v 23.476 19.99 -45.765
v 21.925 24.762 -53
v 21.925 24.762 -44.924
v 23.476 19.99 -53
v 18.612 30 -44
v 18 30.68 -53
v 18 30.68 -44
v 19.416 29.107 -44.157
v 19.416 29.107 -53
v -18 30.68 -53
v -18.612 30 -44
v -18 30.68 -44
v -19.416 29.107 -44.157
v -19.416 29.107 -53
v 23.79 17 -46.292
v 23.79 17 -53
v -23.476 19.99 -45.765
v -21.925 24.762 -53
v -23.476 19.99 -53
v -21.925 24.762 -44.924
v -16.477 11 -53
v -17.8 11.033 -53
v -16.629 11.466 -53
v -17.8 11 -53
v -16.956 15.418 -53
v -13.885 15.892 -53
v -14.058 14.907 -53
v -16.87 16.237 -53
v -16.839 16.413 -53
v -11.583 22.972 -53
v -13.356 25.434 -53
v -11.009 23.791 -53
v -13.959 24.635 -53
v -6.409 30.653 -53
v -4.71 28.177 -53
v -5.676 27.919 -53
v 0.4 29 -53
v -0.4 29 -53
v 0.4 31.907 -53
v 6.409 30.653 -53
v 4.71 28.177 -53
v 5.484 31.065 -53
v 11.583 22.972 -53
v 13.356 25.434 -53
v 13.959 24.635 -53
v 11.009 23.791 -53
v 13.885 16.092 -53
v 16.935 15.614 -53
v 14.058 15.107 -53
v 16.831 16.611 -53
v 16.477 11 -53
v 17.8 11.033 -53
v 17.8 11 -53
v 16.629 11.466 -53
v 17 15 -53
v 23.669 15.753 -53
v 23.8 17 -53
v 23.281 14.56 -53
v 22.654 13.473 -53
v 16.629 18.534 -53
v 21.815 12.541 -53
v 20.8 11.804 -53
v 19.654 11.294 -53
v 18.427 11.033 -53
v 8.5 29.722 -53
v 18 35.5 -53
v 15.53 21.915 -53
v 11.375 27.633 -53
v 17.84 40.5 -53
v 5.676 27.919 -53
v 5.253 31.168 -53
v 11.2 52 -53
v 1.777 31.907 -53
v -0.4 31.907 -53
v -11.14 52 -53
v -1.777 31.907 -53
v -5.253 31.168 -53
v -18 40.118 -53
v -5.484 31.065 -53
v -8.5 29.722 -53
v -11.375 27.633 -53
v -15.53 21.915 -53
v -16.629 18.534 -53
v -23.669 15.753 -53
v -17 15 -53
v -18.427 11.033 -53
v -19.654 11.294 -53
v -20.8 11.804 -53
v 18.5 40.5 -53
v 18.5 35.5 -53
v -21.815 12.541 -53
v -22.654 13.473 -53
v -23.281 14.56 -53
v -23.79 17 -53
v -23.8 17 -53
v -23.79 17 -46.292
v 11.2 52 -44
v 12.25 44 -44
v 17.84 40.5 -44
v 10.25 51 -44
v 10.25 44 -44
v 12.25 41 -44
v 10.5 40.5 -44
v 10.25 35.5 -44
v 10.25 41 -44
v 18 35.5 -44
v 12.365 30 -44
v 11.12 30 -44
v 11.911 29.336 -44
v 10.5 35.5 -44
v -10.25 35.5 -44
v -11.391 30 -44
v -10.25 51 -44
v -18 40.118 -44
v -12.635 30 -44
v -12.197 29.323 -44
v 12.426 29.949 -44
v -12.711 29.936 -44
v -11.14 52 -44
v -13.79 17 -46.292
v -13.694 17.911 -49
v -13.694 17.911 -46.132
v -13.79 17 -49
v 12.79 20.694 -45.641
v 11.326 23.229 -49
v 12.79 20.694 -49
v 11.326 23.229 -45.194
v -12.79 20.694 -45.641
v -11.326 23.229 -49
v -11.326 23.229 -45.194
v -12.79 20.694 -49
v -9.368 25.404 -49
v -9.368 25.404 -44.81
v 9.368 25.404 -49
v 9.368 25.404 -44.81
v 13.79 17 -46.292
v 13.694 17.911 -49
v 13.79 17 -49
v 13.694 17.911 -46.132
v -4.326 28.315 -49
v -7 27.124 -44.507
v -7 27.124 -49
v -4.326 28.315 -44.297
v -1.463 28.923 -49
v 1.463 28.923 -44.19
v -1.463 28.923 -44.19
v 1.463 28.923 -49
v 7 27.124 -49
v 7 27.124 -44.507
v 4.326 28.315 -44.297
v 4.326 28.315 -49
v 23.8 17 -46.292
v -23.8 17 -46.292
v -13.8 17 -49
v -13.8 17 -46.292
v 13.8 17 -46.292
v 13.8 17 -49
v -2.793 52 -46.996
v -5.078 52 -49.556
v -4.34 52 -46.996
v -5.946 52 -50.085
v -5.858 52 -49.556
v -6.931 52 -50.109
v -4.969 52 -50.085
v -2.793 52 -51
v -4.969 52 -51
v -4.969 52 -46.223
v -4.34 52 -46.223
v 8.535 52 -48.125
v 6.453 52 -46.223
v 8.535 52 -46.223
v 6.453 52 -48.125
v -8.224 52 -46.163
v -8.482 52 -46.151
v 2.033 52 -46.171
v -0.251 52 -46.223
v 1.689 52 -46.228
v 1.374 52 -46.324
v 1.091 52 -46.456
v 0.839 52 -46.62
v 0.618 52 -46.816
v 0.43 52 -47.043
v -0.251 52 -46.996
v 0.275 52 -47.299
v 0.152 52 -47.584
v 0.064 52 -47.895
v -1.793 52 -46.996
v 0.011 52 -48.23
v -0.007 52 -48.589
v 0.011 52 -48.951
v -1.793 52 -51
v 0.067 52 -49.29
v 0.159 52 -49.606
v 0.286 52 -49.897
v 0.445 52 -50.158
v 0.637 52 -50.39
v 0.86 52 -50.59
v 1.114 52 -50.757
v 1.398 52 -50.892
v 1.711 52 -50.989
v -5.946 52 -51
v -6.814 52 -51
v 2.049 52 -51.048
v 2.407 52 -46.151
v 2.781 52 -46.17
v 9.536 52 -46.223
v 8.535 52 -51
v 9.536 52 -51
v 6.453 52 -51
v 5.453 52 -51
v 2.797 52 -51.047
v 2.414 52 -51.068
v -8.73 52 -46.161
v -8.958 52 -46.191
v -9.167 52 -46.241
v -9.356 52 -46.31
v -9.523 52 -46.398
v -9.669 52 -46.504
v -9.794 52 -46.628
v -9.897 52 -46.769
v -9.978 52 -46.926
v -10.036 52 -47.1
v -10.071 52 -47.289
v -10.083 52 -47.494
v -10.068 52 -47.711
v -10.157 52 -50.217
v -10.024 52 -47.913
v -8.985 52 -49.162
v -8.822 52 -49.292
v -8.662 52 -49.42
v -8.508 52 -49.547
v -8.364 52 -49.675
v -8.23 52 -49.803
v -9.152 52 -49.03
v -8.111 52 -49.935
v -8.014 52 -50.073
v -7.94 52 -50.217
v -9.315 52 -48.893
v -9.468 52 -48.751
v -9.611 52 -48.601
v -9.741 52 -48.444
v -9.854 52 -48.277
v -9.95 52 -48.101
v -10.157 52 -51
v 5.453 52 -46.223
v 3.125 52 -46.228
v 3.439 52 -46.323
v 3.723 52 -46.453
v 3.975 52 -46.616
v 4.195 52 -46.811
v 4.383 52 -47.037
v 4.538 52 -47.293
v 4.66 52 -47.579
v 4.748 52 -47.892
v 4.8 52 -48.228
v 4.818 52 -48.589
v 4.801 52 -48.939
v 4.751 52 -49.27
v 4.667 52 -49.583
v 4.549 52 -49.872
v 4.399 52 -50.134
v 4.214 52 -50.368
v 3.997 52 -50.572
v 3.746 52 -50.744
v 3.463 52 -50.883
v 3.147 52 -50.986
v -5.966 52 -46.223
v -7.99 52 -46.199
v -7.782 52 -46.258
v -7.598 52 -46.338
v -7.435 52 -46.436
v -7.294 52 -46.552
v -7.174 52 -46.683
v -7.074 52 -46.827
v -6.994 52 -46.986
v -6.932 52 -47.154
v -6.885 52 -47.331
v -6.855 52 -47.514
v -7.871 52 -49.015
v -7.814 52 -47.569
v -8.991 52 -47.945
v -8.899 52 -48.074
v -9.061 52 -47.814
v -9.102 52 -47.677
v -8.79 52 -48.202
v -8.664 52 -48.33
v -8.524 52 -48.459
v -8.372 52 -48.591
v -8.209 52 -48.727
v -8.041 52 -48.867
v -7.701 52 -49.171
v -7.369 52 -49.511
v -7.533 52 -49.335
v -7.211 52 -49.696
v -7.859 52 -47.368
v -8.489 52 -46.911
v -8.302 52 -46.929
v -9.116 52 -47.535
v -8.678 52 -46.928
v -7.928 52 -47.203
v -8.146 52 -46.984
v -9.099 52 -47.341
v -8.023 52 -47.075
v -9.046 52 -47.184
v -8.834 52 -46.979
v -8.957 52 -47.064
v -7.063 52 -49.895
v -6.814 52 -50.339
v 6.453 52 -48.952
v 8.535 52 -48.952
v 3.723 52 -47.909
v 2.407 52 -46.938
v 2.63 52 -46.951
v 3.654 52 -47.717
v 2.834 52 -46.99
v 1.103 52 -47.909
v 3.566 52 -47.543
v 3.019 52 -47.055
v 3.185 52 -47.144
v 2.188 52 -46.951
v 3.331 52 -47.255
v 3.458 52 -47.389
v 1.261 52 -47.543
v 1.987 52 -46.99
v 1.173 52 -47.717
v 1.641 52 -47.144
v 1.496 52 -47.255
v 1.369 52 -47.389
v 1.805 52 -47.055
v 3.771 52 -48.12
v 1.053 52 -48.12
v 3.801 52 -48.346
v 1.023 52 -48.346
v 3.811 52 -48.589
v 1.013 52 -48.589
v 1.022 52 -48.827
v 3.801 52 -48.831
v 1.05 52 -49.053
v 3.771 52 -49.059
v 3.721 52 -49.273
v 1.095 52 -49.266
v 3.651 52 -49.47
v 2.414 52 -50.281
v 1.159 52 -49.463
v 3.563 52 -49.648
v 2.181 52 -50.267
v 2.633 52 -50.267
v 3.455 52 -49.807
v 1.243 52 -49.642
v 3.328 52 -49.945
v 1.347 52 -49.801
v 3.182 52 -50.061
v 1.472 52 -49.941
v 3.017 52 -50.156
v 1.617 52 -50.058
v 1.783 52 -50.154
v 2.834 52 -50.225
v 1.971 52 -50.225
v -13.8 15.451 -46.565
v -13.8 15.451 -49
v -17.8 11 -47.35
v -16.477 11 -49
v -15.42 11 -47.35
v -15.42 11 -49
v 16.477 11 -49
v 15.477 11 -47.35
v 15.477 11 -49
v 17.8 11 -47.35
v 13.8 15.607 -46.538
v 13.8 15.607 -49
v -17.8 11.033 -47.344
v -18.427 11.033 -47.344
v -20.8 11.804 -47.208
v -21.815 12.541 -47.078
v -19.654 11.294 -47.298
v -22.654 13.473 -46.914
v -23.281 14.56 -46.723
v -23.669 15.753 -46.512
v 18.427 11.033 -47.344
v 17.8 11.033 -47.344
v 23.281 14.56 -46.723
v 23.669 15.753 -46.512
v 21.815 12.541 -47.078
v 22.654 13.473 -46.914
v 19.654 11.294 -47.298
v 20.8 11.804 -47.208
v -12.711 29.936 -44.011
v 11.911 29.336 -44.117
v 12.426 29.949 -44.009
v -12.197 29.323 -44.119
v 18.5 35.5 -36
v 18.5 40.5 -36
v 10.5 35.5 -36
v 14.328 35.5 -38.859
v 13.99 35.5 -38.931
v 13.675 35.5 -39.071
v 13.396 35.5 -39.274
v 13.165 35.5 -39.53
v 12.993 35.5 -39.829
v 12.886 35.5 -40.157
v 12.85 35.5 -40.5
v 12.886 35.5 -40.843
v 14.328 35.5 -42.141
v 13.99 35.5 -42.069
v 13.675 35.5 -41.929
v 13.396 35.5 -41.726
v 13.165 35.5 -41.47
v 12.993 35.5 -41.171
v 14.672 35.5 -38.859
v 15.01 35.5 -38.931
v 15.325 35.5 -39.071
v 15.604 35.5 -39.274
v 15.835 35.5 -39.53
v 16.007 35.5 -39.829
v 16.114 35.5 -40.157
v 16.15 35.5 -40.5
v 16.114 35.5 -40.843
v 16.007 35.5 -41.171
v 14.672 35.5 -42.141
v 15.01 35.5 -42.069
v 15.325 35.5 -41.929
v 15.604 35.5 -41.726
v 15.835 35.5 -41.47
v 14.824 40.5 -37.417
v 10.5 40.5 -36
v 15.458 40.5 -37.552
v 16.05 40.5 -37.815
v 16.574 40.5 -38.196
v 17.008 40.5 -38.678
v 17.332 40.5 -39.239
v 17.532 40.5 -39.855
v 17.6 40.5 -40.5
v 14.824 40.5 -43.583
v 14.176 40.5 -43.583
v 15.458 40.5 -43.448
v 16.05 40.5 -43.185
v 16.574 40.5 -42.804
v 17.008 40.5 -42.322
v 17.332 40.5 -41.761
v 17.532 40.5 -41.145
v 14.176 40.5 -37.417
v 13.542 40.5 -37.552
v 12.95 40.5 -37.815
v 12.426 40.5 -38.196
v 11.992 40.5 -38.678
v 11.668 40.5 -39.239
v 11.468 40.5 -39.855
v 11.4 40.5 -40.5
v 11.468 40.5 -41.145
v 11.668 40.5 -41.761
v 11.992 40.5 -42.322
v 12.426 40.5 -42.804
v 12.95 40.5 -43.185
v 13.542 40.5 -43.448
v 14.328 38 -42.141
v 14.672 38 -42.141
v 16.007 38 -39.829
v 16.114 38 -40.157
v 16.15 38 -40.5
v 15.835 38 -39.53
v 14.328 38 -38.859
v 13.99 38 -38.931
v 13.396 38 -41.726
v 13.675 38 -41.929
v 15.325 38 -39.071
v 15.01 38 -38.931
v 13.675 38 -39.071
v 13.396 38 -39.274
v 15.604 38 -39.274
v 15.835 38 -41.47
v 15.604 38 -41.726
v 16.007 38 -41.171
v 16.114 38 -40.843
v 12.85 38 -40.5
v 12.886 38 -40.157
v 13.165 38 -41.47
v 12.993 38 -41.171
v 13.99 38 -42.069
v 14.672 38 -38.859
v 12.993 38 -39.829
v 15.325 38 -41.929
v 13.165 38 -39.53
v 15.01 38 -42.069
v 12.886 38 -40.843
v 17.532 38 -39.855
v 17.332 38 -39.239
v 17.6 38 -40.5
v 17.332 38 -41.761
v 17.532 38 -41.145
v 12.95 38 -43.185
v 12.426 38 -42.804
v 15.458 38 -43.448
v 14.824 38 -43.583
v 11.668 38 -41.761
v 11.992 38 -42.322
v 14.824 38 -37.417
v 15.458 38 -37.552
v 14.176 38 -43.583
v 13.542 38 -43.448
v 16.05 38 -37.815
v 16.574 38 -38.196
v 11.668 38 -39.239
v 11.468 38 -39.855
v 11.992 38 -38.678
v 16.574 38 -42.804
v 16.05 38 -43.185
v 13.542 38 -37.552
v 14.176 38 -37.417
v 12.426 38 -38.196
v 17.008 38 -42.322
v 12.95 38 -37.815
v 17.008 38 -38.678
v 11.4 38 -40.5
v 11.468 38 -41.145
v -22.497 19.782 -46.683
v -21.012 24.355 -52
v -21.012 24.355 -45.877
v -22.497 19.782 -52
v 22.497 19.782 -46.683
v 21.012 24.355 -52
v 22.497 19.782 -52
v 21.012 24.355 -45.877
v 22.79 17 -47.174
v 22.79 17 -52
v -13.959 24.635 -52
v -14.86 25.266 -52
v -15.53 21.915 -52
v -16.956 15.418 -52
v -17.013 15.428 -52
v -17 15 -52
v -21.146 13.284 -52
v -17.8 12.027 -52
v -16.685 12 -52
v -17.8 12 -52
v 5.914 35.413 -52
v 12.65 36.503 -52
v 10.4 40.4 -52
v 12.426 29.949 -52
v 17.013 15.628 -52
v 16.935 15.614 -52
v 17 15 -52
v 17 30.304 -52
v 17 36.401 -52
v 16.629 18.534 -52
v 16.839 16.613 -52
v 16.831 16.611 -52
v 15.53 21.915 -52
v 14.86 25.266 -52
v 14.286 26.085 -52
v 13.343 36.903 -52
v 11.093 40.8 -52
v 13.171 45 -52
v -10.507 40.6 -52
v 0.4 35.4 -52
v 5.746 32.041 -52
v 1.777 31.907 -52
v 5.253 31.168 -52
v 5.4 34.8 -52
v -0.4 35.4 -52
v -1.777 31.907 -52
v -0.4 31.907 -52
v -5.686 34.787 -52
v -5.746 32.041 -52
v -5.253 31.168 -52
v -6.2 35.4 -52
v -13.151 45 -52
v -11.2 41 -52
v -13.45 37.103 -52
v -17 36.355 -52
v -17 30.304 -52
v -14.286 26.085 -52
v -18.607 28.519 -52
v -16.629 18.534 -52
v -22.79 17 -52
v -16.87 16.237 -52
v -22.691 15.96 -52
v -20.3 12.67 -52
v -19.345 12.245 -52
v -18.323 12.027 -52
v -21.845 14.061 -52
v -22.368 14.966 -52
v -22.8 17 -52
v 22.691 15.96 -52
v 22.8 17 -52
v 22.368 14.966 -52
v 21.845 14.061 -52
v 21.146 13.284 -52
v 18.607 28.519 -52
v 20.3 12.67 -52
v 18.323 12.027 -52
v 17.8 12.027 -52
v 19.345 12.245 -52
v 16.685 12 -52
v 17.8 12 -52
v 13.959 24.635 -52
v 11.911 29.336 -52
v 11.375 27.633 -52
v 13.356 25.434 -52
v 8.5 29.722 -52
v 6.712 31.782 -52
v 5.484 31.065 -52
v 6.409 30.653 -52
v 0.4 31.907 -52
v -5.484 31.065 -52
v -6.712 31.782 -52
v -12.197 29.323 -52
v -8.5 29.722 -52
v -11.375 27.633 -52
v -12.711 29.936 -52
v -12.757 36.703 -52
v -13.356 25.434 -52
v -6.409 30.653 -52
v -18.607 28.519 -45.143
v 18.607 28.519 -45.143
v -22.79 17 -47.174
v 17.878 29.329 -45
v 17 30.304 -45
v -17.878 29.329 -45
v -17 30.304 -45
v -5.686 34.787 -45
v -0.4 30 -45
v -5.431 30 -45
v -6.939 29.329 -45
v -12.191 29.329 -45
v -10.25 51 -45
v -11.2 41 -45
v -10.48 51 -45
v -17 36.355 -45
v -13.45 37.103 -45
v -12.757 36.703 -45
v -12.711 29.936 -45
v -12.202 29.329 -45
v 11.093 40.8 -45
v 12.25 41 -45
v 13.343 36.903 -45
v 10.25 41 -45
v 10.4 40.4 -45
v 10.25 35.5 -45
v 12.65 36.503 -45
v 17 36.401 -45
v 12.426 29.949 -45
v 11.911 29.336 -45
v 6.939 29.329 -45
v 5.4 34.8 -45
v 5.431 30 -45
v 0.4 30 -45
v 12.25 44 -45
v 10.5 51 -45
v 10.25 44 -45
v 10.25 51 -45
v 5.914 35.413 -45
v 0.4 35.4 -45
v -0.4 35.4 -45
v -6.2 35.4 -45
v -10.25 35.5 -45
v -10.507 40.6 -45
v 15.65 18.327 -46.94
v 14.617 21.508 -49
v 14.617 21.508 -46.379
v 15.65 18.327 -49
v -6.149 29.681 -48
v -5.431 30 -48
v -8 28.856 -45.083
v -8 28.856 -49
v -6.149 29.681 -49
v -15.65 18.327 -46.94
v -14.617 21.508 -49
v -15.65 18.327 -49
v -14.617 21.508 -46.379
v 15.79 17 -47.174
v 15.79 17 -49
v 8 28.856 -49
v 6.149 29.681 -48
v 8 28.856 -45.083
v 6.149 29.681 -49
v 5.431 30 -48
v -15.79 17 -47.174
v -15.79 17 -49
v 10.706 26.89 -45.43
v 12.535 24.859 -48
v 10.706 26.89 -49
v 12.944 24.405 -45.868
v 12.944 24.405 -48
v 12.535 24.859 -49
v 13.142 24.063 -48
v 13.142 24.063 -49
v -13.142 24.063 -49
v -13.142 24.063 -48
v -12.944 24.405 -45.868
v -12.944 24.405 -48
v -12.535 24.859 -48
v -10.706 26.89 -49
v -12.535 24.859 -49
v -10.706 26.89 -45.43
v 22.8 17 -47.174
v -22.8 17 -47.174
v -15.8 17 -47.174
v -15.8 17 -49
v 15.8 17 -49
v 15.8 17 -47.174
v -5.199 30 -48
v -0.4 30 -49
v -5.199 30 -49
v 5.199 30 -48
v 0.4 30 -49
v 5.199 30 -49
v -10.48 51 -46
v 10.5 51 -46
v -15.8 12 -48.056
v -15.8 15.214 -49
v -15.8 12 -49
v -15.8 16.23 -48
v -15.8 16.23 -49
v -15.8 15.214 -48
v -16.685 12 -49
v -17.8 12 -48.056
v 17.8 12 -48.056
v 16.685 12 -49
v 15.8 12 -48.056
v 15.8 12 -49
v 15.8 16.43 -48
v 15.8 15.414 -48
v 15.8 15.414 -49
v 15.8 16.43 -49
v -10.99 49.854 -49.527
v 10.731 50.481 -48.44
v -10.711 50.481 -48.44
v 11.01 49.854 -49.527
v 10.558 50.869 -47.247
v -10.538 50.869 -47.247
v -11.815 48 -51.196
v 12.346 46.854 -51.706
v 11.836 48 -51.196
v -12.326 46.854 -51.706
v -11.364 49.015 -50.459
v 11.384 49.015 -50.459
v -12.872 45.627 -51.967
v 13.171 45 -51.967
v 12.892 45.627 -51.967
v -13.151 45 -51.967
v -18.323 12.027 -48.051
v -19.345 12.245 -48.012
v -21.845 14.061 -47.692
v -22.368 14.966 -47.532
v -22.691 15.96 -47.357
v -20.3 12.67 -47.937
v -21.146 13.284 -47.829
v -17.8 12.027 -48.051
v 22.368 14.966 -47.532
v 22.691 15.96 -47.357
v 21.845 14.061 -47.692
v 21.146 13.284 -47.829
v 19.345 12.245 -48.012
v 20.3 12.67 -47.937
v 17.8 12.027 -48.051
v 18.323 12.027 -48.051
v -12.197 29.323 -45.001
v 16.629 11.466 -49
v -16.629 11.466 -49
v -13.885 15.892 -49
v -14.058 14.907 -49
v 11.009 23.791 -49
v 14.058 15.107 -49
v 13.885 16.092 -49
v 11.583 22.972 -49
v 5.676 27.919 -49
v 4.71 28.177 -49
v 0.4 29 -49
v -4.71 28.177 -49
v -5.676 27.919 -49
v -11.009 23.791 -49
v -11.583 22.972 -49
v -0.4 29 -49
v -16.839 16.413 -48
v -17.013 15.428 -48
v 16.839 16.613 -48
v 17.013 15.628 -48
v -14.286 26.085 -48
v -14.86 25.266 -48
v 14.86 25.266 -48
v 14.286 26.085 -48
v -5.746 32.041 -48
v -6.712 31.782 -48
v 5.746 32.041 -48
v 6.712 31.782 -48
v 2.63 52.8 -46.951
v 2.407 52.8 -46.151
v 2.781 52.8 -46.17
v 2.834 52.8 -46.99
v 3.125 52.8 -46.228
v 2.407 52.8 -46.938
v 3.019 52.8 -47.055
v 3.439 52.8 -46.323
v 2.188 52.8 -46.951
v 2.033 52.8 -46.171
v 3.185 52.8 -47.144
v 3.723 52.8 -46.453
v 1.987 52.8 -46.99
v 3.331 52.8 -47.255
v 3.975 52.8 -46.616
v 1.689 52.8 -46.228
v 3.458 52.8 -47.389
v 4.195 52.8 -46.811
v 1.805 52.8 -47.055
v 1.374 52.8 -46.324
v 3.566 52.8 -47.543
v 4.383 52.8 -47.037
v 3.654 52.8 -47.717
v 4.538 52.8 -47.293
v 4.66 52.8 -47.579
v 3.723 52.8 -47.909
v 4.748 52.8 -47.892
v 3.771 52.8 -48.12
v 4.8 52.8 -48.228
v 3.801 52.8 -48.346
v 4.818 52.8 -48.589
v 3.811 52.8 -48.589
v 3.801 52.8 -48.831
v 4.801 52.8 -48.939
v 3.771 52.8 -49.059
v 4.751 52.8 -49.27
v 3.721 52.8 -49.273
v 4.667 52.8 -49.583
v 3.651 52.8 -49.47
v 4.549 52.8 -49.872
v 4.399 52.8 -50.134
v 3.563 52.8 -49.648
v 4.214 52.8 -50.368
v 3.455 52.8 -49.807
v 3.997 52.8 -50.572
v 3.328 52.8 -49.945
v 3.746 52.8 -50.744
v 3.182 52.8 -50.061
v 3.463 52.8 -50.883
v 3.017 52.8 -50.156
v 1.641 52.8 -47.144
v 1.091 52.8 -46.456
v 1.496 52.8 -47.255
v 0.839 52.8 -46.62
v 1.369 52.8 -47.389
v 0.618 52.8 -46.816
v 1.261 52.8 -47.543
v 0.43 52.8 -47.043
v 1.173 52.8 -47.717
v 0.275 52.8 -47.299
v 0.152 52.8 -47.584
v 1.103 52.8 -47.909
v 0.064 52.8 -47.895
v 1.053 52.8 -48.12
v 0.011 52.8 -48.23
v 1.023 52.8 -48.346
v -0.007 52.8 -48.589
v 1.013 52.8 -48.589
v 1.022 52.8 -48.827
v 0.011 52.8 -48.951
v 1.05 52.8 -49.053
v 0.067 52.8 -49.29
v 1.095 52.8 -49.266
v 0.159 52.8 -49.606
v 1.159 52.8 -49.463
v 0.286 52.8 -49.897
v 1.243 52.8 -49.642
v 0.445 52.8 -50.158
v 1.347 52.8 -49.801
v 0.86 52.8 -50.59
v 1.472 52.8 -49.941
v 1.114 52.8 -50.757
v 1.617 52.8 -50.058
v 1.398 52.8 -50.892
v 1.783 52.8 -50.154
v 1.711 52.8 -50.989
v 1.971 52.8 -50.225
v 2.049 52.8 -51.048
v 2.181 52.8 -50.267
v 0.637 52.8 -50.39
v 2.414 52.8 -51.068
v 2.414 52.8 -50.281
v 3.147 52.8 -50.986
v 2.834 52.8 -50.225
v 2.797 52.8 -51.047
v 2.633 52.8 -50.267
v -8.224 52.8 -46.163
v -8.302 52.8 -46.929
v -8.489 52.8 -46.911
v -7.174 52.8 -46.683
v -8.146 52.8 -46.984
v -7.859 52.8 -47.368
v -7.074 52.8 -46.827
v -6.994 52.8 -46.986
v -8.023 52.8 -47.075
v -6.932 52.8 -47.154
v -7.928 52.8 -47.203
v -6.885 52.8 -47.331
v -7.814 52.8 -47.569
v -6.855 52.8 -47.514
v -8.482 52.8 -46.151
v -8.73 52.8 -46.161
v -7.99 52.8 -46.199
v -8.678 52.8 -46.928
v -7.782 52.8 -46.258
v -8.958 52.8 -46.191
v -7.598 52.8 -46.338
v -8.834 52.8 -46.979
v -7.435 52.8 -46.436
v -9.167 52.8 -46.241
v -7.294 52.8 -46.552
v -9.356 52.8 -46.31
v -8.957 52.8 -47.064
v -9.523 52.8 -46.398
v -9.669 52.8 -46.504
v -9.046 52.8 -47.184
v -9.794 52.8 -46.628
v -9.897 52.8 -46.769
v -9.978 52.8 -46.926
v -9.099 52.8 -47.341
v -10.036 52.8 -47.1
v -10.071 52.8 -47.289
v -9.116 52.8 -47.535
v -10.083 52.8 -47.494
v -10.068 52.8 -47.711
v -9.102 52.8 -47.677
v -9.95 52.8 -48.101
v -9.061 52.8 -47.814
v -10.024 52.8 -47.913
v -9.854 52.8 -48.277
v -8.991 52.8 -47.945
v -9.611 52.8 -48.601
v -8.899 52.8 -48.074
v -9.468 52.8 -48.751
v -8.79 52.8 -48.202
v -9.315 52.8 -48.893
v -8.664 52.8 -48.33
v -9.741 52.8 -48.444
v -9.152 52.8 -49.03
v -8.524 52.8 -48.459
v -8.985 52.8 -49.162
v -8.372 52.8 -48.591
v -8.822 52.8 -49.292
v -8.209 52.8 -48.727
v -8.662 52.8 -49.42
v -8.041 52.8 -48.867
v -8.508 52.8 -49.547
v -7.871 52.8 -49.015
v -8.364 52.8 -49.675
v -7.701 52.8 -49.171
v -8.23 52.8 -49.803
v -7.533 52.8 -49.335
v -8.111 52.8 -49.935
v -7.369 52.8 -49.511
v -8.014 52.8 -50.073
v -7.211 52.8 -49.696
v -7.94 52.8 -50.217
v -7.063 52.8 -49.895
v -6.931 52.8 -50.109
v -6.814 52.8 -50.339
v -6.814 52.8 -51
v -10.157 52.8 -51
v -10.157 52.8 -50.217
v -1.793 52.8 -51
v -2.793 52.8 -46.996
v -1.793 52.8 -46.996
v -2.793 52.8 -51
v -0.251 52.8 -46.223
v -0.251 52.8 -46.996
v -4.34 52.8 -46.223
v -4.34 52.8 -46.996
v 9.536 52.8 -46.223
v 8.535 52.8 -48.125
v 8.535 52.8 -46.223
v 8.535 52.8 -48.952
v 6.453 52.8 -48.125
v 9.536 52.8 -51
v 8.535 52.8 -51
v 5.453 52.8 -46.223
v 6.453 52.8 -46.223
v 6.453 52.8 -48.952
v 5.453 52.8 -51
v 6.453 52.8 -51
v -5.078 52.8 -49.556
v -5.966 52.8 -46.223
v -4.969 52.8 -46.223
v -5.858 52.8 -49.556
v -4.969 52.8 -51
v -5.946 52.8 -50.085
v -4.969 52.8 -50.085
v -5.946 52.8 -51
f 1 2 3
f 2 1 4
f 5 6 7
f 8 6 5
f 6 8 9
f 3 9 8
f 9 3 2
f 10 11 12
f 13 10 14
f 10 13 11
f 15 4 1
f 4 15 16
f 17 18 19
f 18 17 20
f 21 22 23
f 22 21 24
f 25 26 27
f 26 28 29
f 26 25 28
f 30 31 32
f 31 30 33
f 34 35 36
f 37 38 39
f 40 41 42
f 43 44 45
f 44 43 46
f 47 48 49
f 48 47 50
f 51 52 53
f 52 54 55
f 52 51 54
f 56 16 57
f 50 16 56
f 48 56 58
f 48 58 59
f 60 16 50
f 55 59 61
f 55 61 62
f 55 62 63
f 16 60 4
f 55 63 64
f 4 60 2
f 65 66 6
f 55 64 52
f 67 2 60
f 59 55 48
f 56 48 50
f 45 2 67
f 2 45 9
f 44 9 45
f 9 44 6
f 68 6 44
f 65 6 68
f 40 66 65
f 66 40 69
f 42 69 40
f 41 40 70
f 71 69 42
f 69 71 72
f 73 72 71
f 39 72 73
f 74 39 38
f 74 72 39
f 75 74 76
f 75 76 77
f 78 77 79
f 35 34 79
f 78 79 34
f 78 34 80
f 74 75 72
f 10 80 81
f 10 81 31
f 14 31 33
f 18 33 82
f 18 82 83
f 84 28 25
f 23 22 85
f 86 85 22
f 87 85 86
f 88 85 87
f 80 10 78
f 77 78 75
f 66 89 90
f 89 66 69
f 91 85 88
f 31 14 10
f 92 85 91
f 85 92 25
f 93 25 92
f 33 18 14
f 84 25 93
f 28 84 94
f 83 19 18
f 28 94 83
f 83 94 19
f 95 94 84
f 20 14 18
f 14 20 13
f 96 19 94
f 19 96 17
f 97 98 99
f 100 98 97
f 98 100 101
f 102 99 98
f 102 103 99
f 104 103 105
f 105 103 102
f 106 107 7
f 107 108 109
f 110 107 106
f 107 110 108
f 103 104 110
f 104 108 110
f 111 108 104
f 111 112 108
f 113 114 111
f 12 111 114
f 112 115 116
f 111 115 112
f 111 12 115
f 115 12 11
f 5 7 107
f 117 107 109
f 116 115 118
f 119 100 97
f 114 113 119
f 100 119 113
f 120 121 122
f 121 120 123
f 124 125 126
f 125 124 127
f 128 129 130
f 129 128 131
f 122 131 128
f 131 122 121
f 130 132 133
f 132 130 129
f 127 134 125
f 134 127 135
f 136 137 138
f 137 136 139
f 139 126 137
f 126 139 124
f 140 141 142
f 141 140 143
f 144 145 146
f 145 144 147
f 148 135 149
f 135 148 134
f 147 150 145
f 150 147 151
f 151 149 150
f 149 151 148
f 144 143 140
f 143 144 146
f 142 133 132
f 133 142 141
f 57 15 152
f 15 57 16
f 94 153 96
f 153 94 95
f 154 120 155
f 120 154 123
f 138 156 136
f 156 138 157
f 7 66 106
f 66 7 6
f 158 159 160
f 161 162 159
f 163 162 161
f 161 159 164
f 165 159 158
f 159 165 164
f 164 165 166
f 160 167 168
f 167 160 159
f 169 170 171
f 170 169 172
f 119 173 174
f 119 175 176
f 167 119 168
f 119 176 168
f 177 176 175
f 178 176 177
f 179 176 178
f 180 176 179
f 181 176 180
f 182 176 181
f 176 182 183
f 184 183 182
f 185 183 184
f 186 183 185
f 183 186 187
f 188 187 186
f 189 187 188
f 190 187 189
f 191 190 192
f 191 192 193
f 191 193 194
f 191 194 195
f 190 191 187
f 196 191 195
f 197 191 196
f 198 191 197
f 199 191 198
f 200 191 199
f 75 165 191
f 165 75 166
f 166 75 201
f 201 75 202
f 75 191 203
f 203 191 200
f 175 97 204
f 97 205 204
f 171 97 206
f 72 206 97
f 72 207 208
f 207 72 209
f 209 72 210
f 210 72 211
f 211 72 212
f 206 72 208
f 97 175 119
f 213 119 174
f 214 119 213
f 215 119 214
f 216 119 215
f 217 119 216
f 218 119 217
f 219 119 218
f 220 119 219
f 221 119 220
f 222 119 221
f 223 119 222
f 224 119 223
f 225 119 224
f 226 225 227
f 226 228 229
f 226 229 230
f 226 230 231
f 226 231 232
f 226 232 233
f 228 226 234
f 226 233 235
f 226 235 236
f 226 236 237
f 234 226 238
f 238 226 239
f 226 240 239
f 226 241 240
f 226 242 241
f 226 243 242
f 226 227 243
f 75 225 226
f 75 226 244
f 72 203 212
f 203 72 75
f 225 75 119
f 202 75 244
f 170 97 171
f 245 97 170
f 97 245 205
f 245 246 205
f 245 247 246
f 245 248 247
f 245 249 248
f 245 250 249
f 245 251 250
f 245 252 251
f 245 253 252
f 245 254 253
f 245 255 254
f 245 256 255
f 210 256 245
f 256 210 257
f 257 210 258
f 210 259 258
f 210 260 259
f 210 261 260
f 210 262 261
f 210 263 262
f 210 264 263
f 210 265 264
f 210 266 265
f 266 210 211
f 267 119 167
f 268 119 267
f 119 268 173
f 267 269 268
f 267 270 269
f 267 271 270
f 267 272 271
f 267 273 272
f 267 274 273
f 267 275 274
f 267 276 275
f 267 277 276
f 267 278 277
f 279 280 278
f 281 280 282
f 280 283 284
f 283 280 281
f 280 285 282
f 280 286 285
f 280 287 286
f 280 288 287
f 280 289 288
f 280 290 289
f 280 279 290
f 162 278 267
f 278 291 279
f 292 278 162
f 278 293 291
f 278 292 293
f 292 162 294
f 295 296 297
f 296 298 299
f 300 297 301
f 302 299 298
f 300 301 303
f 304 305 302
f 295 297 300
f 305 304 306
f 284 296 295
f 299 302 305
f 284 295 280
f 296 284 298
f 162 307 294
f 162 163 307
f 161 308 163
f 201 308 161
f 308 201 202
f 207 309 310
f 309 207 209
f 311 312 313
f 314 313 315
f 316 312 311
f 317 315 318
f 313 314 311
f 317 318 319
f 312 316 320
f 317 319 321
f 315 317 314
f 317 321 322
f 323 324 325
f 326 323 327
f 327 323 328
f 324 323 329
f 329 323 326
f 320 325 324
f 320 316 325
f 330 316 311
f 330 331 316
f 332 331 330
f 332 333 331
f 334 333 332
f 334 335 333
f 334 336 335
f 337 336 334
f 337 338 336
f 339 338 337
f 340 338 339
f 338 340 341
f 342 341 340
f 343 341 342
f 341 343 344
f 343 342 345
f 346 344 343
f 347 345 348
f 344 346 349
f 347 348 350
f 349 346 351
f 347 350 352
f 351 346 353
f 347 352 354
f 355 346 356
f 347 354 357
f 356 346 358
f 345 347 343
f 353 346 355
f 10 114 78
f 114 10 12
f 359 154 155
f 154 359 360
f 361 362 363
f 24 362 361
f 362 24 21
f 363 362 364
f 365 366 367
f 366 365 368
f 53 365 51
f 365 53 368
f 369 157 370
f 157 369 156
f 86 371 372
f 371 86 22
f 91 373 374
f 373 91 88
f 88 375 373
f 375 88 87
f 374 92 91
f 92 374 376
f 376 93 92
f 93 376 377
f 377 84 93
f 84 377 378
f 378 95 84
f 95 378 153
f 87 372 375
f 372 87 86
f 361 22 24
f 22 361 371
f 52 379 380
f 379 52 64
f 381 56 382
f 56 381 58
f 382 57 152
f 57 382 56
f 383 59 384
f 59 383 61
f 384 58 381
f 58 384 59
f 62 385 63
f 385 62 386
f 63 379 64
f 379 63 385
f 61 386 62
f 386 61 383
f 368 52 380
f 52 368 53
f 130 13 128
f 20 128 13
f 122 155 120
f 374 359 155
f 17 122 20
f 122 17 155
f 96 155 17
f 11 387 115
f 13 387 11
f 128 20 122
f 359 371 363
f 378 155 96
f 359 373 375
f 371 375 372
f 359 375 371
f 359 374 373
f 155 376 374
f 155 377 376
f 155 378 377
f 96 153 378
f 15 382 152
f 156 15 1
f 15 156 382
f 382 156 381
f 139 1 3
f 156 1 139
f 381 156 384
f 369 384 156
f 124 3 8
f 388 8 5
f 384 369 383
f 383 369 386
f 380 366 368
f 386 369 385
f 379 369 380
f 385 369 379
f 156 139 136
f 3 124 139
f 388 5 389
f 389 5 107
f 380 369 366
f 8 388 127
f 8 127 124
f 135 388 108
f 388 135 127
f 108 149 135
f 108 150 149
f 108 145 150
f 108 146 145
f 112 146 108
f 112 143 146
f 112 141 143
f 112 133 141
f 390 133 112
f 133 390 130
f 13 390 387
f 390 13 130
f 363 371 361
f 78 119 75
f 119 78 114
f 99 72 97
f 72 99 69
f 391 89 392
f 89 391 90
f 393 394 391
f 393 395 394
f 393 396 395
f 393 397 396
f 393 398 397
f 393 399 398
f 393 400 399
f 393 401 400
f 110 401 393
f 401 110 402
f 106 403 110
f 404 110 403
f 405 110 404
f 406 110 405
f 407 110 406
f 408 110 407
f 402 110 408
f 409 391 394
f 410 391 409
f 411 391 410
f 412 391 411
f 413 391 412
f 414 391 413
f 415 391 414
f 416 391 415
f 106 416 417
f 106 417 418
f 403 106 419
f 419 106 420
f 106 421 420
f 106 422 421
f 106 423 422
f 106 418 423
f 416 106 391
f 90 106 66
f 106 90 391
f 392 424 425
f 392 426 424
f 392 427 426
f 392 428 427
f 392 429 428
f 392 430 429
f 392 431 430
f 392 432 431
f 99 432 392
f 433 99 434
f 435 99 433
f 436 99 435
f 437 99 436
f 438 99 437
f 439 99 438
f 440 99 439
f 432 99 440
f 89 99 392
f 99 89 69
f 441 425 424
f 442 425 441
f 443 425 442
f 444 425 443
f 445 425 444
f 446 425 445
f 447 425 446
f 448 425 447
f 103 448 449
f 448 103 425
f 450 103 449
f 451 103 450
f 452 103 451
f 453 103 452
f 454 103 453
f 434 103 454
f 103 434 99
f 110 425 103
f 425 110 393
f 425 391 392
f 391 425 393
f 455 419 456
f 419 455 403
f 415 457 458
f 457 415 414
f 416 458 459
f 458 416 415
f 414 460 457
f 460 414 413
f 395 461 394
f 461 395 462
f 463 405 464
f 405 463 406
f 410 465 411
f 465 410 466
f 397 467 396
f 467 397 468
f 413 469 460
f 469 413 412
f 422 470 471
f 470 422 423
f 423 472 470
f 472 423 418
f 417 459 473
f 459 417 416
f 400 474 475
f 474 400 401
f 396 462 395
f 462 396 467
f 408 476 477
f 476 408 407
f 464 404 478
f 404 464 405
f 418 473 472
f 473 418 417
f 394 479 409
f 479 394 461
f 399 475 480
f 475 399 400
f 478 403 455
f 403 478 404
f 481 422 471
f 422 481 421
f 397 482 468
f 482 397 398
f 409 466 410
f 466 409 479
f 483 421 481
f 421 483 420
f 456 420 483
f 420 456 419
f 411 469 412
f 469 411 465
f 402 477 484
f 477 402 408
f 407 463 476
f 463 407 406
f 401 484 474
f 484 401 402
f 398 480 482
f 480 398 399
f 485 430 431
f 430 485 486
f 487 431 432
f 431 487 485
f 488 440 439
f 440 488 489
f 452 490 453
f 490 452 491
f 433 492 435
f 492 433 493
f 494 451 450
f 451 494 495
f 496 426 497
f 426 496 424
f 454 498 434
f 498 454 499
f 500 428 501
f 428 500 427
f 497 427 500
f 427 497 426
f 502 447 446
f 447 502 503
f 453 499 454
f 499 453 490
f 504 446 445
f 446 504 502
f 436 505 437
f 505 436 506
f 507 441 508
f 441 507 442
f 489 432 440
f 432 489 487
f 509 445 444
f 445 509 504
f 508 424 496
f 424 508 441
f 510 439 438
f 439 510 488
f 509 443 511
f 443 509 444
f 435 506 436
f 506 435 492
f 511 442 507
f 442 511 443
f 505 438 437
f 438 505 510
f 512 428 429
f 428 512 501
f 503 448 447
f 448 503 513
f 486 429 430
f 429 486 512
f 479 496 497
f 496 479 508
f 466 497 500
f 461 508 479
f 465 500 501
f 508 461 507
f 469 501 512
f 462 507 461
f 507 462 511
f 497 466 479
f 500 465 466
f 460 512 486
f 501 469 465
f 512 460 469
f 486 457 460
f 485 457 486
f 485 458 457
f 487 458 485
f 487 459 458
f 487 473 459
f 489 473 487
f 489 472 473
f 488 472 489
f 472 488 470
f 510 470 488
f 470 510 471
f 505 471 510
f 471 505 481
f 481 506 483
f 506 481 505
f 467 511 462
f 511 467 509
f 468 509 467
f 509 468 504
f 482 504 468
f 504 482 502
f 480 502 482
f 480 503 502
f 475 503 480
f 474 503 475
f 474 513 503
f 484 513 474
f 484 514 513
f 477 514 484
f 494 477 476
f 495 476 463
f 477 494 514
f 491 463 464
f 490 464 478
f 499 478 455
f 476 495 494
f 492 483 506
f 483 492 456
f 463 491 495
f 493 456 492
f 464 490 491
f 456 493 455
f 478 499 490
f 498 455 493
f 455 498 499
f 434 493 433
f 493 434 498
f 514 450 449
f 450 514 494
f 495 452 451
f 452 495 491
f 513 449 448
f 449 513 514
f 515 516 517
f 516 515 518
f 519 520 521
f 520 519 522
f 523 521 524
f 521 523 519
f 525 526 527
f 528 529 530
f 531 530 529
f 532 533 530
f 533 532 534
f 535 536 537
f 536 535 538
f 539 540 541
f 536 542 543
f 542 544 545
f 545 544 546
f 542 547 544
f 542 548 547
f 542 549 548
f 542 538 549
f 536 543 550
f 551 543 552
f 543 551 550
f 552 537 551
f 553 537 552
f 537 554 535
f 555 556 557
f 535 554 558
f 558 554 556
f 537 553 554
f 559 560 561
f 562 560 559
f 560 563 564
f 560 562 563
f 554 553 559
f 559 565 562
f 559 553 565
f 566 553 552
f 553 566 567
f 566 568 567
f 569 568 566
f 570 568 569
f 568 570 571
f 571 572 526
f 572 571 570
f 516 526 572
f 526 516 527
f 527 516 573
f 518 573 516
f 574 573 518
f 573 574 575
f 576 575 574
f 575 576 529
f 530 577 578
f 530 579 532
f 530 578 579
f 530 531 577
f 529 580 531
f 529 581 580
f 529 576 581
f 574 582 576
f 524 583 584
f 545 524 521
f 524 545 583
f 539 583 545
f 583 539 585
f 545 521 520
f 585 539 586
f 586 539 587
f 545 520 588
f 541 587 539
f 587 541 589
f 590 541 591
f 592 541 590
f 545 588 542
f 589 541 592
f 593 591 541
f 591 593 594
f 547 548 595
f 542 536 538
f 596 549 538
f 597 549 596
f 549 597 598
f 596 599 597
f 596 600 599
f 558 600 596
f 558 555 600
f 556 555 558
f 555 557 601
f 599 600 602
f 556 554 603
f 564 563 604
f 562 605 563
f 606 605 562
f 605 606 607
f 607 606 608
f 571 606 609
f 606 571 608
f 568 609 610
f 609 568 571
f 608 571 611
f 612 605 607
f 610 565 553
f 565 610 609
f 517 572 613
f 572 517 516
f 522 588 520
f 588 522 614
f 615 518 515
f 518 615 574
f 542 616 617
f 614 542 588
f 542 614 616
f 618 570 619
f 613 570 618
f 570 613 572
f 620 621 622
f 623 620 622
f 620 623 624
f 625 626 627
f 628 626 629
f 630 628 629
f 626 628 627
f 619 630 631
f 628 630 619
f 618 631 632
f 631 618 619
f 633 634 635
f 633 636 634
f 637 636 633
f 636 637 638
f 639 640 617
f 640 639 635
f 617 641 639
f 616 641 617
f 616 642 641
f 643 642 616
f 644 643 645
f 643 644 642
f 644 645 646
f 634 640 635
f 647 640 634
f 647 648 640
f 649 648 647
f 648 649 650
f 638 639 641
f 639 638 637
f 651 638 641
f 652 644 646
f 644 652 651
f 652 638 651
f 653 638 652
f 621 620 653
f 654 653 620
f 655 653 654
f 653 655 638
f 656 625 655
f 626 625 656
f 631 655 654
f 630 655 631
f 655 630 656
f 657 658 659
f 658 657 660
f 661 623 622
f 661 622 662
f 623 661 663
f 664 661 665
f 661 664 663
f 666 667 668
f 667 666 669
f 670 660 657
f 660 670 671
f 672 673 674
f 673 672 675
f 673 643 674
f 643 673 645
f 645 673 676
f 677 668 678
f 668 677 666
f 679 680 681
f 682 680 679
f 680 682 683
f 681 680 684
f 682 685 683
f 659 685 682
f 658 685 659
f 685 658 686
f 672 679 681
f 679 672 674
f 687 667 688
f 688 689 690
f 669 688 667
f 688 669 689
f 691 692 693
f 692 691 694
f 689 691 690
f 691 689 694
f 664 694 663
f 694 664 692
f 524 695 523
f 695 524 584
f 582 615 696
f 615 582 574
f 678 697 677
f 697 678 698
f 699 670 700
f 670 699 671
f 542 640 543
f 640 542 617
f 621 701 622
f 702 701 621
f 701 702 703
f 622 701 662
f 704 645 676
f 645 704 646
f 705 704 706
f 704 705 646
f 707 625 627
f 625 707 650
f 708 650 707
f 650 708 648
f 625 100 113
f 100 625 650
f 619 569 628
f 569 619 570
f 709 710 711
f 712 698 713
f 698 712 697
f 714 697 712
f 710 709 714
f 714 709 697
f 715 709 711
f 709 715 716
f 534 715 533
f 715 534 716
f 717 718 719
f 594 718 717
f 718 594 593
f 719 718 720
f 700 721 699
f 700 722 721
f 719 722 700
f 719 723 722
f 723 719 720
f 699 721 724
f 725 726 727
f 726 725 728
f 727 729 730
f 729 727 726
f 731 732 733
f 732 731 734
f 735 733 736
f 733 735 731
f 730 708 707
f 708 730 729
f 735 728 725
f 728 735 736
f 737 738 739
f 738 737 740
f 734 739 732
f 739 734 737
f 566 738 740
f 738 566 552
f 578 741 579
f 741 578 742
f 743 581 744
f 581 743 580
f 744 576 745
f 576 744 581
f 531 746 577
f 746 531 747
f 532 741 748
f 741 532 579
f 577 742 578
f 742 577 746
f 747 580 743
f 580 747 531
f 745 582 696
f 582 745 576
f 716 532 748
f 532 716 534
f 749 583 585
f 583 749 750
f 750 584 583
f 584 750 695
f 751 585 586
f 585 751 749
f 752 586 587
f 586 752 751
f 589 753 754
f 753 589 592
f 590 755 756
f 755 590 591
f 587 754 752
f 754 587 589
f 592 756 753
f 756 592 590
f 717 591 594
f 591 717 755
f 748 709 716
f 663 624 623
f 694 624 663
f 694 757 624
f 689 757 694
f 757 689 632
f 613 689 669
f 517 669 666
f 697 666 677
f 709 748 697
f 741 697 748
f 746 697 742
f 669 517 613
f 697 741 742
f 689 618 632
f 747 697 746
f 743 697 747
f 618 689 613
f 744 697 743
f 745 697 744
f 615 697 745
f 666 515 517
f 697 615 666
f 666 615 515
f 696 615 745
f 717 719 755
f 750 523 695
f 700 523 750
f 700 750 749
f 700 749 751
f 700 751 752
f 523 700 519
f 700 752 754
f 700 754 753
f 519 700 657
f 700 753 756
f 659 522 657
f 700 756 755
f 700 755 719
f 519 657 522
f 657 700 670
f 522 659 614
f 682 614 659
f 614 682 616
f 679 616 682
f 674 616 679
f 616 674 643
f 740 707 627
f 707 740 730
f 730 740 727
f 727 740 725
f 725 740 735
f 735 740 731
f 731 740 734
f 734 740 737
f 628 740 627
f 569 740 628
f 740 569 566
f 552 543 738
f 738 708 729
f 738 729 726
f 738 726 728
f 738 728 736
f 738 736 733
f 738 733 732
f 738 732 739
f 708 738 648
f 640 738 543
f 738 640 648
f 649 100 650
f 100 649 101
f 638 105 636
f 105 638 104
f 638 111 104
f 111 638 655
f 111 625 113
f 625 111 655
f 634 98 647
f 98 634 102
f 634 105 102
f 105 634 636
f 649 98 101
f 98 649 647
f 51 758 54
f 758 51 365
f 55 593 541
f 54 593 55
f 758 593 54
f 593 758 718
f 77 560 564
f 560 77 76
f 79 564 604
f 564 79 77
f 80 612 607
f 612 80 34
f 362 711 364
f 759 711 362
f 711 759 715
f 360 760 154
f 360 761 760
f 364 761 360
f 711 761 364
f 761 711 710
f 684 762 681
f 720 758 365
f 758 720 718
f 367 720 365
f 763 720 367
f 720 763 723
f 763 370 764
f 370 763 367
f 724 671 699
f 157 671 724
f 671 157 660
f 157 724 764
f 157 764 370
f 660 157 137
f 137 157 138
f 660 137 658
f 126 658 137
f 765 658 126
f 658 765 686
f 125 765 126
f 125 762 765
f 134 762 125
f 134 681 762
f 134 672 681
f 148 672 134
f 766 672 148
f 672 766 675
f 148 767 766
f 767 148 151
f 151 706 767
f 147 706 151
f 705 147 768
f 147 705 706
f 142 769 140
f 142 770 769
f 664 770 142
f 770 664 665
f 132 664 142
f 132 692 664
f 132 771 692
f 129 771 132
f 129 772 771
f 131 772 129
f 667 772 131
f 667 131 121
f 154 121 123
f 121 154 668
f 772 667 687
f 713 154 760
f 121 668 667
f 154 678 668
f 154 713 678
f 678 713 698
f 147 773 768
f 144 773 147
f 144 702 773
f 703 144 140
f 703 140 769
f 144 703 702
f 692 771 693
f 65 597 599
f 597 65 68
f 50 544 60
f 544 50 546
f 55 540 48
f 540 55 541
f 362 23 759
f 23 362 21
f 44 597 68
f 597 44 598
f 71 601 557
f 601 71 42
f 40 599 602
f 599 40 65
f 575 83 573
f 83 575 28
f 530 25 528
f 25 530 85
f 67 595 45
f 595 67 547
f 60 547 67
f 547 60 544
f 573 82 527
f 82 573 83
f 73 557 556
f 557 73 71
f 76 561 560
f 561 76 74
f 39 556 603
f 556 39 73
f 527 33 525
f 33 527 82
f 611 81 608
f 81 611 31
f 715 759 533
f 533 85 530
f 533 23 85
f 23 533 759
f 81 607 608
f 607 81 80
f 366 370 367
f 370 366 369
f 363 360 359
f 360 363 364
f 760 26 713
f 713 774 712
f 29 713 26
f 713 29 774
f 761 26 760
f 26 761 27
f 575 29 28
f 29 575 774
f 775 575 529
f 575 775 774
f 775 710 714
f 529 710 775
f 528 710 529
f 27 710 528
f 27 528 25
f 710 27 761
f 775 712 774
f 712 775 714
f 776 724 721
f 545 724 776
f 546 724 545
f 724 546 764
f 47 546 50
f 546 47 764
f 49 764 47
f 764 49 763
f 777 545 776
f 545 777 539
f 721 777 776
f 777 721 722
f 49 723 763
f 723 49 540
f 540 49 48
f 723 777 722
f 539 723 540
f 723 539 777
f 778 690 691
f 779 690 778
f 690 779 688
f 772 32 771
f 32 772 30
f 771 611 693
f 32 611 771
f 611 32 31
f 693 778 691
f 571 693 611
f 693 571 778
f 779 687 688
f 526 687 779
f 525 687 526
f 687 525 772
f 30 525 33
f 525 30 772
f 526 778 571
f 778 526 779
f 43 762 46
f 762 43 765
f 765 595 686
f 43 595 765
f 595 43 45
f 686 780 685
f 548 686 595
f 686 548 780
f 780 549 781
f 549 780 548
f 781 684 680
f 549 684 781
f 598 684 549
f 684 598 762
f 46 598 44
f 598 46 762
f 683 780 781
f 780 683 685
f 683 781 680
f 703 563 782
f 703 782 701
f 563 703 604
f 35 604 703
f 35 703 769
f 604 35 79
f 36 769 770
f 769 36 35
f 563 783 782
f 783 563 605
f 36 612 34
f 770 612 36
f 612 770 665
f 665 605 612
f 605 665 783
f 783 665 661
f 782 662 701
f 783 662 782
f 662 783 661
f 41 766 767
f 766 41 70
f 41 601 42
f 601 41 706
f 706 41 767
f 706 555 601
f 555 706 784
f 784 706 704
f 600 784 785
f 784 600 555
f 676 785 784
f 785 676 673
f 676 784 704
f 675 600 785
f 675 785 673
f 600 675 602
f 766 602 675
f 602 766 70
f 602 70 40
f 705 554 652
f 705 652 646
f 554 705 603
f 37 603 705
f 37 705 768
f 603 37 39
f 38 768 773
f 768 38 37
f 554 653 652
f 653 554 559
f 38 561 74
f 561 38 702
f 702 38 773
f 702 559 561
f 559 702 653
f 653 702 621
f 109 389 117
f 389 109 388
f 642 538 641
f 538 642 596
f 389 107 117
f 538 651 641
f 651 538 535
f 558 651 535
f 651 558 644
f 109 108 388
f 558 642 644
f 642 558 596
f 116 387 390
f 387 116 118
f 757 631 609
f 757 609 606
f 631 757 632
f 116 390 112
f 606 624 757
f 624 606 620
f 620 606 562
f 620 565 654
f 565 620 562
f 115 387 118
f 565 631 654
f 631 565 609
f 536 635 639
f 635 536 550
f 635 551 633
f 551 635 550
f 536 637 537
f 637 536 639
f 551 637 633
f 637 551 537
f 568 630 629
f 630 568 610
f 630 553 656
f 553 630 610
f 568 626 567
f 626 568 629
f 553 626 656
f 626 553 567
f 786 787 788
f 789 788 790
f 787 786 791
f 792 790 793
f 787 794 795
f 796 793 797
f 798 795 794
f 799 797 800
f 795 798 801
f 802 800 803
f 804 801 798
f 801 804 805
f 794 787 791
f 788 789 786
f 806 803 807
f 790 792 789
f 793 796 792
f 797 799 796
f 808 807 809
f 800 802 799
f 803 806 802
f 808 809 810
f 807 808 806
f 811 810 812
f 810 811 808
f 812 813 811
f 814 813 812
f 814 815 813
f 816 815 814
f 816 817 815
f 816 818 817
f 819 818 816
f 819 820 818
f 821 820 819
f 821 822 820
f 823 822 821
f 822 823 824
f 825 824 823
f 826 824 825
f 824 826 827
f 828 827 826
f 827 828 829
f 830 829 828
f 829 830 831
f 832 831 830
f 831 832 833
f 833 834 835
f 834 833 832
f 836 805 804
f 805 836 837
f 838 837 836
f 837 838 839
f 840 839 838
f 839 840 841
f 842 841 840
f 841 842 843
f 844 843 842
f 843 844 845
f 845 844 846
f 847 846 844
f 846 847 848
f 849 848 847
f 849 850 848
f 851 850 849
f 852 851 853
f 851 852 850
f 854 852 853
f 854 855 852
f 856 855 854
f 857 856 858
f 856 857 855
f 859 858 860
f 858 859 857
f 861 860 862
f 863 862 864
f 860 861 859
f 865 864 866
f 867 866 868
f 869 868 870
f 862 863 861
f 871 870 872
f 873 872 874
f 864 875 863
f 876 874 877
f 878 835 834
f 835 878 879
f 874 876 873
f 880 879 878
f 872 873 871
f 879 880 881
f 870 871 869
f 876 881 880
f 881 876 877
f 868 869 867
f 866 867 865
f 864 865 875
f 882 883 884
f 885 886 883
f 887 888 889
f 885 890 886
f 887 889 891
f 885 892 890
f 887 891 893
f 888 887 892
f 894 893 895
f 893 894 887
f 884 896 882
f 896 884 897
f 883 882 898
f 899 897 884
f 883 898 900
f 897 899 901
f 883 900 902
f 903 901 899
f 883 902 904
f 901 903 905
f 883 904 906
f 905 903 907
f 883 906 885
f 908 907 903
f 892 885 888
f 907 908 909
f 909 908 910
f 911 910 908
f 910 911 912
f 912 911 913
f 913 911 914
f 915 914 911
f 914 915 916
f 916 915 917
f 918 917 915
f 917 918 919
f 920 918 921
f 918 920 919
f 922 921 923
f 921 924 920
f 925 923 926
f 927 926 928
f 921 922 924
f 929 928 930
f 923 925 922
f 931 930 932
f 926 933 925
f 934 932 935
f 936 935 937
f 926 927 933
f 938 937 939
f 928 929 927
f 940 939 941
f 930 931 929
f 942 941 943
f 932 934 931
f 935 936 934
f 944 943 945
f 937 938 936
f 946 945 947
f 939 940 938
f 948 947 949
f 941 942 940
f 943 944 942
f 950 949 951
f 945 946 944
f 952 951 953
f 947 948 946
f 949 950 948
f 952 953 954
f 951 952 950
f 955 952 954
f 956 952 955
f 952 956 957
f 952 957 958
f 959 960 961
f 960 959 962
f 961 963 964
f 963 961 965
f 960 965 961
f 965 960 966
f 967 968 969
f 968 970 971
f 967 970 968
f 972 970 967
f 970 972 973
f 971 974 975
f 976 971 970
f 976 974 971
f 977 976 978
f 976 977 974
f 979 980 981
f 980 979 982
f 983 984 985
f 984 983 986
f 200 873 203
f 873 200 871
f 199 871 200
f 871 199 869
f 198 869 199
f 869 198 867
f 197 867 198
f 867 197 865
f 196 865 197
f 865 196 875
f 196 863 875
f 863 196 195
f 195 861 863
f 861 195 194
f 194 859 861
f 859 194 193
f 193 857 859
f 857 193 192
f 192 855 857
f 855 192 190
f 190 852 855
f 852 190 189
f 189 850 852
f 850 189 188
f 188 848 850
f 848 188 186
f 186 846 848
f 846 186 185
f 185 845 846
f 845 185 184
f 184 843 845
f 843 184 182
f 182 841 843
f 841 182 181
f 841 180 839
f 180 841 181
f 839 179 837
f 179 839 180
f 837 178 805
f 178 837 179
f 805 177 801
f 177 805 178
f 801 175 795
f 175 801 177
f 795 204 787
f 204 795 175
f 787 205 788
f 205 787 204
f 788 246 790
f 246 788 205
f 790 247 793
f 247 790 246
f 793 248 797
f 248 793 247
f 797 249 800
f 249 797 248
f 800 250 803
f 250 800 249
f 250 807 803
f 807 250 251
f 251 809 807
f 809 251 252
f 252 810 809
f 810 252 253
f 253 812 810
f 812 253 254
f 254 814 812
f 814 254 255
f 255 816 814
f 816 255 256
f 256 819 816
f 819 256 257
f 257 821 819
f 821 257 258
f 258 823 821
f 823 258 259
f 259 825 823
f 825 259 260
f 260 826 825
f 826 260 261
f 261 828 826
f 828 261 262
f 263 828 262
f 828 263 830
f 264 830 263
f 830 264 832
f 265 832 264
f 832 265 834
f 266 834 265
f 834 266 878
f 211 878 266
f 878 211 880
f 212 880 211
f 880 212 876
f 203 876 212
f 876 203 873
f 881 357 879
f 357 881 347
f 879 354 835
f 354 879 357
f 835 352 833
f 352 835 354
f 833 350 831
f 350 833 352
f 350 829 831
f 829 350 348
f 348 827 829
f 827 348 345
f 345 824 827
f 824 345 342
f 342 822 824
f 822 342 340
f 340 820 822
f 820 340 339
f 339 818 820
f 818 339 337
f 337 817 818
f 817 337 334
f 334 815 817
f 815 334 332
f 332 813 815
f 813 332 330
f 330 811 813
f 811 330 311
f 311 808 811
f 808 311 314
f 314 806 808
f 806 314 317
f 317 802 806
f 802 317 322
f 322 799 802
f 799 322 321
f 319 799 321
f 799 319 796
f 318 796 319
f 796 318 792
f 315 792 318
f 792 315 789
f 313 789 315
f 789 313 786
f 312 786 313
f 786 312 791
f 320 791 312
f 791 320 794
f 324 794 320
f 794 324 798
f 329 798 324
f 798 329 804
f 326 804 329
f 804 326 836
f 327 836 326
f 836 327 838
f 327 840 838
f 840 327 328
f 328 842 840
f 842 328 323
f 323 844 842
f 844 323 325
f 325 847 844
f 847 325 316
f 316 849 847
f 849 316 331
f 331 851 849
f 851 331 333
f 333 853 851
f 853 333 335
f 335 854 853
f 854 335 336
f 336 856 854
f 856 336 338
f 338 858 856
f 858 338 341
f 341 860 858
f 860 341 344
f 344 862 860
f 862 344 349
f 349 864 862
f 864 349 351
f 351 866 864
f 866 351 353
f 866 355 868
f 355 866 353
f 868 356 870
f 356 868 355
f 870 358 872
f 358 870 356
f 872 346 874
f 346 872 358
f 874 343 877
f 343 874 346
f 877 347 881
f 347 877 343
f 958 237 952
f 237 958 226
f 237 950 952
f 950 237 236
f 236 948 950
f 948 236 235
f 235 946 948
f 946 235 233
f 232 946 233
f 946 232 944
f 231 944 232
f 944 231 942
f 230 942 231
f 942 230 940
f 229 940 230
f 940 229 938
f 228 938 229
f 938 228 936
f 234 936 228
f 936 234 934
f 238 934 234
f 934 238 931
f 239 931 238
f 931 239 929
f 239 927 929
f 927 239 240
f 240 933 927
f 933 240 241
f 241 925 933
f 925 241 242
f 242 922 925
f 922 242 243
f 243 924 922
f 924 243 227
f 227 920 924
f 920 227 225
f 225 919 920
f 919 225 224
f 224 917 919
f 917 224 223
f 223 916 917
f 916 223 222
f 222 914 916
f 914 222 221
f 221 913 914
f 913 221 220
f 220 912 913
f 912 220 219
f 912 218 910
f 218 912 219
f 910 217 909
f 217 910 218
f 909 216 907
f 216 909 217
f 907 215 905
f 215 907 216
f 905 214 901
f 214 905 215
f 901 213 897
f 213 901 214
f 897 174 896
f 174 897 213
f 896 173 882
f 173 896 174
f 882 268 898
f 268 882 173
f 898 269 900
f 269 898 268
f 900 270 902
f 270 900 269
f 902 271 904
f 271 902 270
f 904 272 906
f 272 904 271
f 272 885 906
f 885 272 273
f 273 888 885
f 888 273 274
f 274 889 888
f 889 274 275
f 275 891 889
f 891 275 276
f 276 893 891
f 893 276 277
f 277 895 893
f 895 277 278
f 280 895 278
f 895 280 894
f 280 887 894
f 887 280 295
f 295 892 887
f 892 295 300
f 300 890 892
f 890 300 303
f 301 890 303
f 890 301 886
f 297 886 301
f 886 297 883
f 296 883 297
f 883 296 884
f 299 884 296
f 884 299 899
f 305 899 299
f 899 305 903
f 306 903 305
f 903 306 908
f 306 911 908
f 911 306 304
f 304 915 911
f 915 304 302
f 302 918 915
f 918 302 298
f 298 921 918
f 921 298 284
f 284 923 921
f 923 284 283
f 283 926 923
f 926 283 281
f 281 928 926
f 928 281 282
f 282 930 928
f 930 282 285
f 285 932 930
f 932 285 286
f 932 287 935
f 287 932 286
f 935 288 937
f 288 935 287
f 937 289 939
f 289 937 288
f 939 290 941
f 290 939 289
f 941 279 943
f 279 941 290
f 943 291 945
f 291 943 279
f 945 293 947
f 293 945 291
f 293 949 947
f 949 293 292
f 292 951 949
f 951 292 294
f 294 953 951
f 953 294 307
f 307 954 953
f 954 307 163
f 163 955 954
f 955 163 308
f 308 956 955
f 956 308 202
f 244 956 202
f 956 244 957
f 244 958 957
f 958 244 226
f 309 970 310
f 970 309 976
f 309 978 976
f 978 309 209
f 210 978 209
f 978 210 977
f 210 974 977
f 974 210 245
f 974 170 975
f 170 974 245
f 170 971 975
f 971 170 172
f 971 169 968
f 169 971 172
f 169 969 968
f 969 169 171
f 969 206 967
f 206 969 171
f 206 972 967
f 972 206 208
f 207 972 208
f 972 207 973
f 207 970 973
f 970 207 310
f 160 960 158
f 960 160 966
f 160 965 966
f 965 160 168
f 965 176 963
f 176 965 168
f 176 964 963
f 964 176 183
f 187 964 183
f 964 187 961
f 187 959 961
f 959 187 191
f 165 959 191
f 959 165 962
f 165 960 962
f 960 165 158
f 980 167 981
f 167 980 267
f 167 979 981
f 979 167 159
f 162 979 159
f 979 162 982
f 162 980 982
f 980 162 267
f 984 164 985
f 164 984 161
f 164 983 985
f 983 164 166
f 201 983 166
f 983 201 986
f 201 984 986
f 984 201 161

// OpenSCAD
// PRUSA iteration4
// Nozzle fan
// GNU GPL v3
// Josef Průša <iam@josefprusa.cz> and contributors
// http://www.reprap.org/wiki/Prusa_Mendel
// http://prusamendel.org

module outer_shape()
{
    difference()
    {    
        union()
        {
            // fan entry block
            translate([-18,-53,-52]) cube([36,9,22]);    
            difference()
            {
                // nozzle base shape
                translate([0,-44,-15]) rotate([90,0,0]) cylinder( h=9, r=24, $fn=30 );
                translate([0,-43,-15]) rotate([90,0,0]) cylinder( h=11, r=14, $fn=30 );
                translate([-25,-54,-17]) cube([50,11,30]);    
            }

            // tips
            translate([-23.8,-53,-17]) cube([10,9,6]);  
            translate([13.8,-53,-17]) cube([10,9,6]);  
        }

        // upper angle cut
        translate([-25,-44,-30]) rotate([10,0,0]) cube([50,10,20]);  
        
        // angled front sides
        translate([-19.8,-54,-57]) rotate([0,-30,0]) cube([10,11,20]);    
        translate([11.2,-54,-52]) rotate([0,30,0]) cube([10,11,20]);    

        // right round edge
        translate([10.2,0,3]) difference()
        {
            translate([-28,-44,-20]) rotate([90,0,0]) cylinder( h=10, r=12, $fn=30 );    
            translate([-28,-43,-20]) rotate([90,0,0]) cylinder( h=12, r=6, $fn=30 );    
            translate([-50,-43,-60]) rotate([90,0,0]) cube([40,40,40]);    
            translate([-28,-43,-40]) rotate([90,0,0]) cube([40,40,40]);    
        }

        // left round edge
        translate([45.8,0,3]) difference()
        {
            translate([-28,-44,-20]) rotate([90,0,0]) cylinder( h=10, r=12, $fn=30 );    
            translate([-28,-43,-20]) rotate([90,0,0]) cylinder( h=12, r=6, $fn=30 );    
            translate([-50,-43,-60]) rotate([90,0,0]) cube([40,40,40]);    
            translate([-68,-43,-40]) rotate([90,0,0]) cube([40,40,40]);    
        }


        
    }

    // mounting block
    difference()
    {
        translate([10.5,-53,-40.5]) cube([8,17,5]);   
        translate([14.5,-40.5,-41]) rotate([0,0,0]) cylinder( h=15, r=1.65, $fn=30 );    
        translate([14.5,-40.5,-42]) rotate([0,0,0]) cylinder( h=4, r=3.1, $fn=30 );    
    }
}



module inner_shape()
{
    difference()
    {    
        union()
        {
            // base block
            translate([-17,-52,-51]) cube([34,7,21]);    
            
            // nozzle inner shape
            difference()
            {
                translate([0,-45,-15]) rotate([90,0,0]) cylinder( h=7, r=23, $fn=30 );
                translate([0,-43,-15]) rotate([90,0,0]) cylinder( h=11, r=16, $fn=30 );
                translate([-25,-54,-17]) cube([50,11,30]);    
            }

            translate([-22.8,-52,-17]) cube([7,7,5]);  
            translate([15.8,-52,-17]) cube([7,7,5]);  
        }
        
        // upper angled cut
        translate([-25,-44,-35]) rotate([10,0,0]) cube([50,10,30]);  
        
        // angled front sides
        translate([-19.2,-54,-56]) rotate([0,-24,0]) cube([10,11,20]);    
        translate([10.5,-54,-51]) rotate([0,24,0]) cube([10,11,20]);    
        
        // smooth entry
        difference()
        {
            translate([-30,-46,-45]) rotate([0,90,0]) cylinder( h=60, r=9, $fn=30 );
            translate([-30,-46,-45]) rotate([0,90,0]) cylinder( h=60, r=6, $fn=30 );
            translate([-30,-46,-52]) cube([60,11,20]);    
            translate([-30,-53,-45]) cube([60,11,20]);    
        }
     
        // left round edge
        translate([10.2,0,3]) difference()
        {
            translate([-28,-44,-20]) rotate([90,0,0]) cylinder( h=10, r=12, $fn=30 );    
            translate([-28,-43,-20]) rotate([90,0,0]) cylinder( h=12, r=5, $fn=30 );    
            translate([-50,-43,-60]) rotate([90,0,0]) cube([40,40,40]);    
            translate([-28,-43,-40]) rotate([90,0,0]) cube([40,40,40]);    
        }

        // right round edge
        translate([45.8,0,3]) difference()
        {
            translate([-28,-44,-20]) rotate([90,0,0]) cylinder( h=10, r=12, $fn=30 );    
            translate([-28,-43,-20]) rotate([90,0,0]) cylinder( h=12, r=5, $fn=30 );    
            translate([-50,-43,-60]) rotate([90,0,0]) cube([40,40,40]);    
            translate([-68,-43,-40]) rotate([90,0,0]) cube([40,40,40]);    
        }
     
     
        
    }

    // fan cut
    translate([-10.25,-46,-51]) cube([20.5,10,15.5]);    
    translate([10.25,-52,-44]) cube([2,15,3]);    

}

 
module base_shape()
{
    difference()
    {
        outer_shape();
        inner_shape();
        // air slot
        translate([0,-49,-15]) rotate([90,0,0]) cylinder( h=7, r=17, $fn=30 );    
    }
}


module fan_nozzle()
{
    difference()
    {
        base_shape();
        
        // nozzle tips cut
        translate([8.7,-53,-15]) rotate([0,20,0]) cube([5,15,15]);    
        translate([-13.6,-53,-16]) rotate([0,-20,0]) cube([5,15,15]);    
    }

    // fins
    translate([8.1,0,-11]) rotate([0,80,0]) translate([0,-53,-25.5]) cube([1,5,3]);    
    translate([-8.1,0,-11.2]) rotate([0,-80,0]) translate([-1,-53,-25.5]) cube([1,5,3]);    
    translate([4.8,0,-11.5]) rotate([0,55,0]) translate([0,-53,-24]) cube([1,5,4]);    
    translate([-4.8,0,-11.5]) rotate([0,-55,0]) translate([-1,-53,-24]) cube([1,5,4]);    
    translate([-0.5,0,-8.6]) rotate([0,15,0]) translate([0,-53,-24]) cube([1,5,4]);    
    translate([0.5,0,-8.6]) rotate([0,-15,0]) translate([-1,-53,-24]) cube([1,5,4]);    


    translate([-0.4,-53,-35.4]) rotate([0,0,0]) cube([0.8,8.8,6.4]); 
    translate([5.4,-53,-34.8]) rotate([0,50,0]) cube([0.8,9,8.5]); 
    translate([-6.2,-53,-35.4]) rotate([0,-50,0]) cube([0.8,9,8.5]); 

    translate([10.4,-53,-40.4]) rotate([0,30,0]) cube([0.8,9,4.5]); 
    translate([-11.2,-53,-41.0]) rotate([0,-30,0]) cube([0.8,9,4.5]); 


    translate([10,-51,-52]) rotate([0,180,0]) linear_extrude(height = 0.8) 
    { text("HOT!2",font = "helvetica:style=Bold", size=5, center=true); }
}

rotate([90,0,0]) fan_nozzle();
